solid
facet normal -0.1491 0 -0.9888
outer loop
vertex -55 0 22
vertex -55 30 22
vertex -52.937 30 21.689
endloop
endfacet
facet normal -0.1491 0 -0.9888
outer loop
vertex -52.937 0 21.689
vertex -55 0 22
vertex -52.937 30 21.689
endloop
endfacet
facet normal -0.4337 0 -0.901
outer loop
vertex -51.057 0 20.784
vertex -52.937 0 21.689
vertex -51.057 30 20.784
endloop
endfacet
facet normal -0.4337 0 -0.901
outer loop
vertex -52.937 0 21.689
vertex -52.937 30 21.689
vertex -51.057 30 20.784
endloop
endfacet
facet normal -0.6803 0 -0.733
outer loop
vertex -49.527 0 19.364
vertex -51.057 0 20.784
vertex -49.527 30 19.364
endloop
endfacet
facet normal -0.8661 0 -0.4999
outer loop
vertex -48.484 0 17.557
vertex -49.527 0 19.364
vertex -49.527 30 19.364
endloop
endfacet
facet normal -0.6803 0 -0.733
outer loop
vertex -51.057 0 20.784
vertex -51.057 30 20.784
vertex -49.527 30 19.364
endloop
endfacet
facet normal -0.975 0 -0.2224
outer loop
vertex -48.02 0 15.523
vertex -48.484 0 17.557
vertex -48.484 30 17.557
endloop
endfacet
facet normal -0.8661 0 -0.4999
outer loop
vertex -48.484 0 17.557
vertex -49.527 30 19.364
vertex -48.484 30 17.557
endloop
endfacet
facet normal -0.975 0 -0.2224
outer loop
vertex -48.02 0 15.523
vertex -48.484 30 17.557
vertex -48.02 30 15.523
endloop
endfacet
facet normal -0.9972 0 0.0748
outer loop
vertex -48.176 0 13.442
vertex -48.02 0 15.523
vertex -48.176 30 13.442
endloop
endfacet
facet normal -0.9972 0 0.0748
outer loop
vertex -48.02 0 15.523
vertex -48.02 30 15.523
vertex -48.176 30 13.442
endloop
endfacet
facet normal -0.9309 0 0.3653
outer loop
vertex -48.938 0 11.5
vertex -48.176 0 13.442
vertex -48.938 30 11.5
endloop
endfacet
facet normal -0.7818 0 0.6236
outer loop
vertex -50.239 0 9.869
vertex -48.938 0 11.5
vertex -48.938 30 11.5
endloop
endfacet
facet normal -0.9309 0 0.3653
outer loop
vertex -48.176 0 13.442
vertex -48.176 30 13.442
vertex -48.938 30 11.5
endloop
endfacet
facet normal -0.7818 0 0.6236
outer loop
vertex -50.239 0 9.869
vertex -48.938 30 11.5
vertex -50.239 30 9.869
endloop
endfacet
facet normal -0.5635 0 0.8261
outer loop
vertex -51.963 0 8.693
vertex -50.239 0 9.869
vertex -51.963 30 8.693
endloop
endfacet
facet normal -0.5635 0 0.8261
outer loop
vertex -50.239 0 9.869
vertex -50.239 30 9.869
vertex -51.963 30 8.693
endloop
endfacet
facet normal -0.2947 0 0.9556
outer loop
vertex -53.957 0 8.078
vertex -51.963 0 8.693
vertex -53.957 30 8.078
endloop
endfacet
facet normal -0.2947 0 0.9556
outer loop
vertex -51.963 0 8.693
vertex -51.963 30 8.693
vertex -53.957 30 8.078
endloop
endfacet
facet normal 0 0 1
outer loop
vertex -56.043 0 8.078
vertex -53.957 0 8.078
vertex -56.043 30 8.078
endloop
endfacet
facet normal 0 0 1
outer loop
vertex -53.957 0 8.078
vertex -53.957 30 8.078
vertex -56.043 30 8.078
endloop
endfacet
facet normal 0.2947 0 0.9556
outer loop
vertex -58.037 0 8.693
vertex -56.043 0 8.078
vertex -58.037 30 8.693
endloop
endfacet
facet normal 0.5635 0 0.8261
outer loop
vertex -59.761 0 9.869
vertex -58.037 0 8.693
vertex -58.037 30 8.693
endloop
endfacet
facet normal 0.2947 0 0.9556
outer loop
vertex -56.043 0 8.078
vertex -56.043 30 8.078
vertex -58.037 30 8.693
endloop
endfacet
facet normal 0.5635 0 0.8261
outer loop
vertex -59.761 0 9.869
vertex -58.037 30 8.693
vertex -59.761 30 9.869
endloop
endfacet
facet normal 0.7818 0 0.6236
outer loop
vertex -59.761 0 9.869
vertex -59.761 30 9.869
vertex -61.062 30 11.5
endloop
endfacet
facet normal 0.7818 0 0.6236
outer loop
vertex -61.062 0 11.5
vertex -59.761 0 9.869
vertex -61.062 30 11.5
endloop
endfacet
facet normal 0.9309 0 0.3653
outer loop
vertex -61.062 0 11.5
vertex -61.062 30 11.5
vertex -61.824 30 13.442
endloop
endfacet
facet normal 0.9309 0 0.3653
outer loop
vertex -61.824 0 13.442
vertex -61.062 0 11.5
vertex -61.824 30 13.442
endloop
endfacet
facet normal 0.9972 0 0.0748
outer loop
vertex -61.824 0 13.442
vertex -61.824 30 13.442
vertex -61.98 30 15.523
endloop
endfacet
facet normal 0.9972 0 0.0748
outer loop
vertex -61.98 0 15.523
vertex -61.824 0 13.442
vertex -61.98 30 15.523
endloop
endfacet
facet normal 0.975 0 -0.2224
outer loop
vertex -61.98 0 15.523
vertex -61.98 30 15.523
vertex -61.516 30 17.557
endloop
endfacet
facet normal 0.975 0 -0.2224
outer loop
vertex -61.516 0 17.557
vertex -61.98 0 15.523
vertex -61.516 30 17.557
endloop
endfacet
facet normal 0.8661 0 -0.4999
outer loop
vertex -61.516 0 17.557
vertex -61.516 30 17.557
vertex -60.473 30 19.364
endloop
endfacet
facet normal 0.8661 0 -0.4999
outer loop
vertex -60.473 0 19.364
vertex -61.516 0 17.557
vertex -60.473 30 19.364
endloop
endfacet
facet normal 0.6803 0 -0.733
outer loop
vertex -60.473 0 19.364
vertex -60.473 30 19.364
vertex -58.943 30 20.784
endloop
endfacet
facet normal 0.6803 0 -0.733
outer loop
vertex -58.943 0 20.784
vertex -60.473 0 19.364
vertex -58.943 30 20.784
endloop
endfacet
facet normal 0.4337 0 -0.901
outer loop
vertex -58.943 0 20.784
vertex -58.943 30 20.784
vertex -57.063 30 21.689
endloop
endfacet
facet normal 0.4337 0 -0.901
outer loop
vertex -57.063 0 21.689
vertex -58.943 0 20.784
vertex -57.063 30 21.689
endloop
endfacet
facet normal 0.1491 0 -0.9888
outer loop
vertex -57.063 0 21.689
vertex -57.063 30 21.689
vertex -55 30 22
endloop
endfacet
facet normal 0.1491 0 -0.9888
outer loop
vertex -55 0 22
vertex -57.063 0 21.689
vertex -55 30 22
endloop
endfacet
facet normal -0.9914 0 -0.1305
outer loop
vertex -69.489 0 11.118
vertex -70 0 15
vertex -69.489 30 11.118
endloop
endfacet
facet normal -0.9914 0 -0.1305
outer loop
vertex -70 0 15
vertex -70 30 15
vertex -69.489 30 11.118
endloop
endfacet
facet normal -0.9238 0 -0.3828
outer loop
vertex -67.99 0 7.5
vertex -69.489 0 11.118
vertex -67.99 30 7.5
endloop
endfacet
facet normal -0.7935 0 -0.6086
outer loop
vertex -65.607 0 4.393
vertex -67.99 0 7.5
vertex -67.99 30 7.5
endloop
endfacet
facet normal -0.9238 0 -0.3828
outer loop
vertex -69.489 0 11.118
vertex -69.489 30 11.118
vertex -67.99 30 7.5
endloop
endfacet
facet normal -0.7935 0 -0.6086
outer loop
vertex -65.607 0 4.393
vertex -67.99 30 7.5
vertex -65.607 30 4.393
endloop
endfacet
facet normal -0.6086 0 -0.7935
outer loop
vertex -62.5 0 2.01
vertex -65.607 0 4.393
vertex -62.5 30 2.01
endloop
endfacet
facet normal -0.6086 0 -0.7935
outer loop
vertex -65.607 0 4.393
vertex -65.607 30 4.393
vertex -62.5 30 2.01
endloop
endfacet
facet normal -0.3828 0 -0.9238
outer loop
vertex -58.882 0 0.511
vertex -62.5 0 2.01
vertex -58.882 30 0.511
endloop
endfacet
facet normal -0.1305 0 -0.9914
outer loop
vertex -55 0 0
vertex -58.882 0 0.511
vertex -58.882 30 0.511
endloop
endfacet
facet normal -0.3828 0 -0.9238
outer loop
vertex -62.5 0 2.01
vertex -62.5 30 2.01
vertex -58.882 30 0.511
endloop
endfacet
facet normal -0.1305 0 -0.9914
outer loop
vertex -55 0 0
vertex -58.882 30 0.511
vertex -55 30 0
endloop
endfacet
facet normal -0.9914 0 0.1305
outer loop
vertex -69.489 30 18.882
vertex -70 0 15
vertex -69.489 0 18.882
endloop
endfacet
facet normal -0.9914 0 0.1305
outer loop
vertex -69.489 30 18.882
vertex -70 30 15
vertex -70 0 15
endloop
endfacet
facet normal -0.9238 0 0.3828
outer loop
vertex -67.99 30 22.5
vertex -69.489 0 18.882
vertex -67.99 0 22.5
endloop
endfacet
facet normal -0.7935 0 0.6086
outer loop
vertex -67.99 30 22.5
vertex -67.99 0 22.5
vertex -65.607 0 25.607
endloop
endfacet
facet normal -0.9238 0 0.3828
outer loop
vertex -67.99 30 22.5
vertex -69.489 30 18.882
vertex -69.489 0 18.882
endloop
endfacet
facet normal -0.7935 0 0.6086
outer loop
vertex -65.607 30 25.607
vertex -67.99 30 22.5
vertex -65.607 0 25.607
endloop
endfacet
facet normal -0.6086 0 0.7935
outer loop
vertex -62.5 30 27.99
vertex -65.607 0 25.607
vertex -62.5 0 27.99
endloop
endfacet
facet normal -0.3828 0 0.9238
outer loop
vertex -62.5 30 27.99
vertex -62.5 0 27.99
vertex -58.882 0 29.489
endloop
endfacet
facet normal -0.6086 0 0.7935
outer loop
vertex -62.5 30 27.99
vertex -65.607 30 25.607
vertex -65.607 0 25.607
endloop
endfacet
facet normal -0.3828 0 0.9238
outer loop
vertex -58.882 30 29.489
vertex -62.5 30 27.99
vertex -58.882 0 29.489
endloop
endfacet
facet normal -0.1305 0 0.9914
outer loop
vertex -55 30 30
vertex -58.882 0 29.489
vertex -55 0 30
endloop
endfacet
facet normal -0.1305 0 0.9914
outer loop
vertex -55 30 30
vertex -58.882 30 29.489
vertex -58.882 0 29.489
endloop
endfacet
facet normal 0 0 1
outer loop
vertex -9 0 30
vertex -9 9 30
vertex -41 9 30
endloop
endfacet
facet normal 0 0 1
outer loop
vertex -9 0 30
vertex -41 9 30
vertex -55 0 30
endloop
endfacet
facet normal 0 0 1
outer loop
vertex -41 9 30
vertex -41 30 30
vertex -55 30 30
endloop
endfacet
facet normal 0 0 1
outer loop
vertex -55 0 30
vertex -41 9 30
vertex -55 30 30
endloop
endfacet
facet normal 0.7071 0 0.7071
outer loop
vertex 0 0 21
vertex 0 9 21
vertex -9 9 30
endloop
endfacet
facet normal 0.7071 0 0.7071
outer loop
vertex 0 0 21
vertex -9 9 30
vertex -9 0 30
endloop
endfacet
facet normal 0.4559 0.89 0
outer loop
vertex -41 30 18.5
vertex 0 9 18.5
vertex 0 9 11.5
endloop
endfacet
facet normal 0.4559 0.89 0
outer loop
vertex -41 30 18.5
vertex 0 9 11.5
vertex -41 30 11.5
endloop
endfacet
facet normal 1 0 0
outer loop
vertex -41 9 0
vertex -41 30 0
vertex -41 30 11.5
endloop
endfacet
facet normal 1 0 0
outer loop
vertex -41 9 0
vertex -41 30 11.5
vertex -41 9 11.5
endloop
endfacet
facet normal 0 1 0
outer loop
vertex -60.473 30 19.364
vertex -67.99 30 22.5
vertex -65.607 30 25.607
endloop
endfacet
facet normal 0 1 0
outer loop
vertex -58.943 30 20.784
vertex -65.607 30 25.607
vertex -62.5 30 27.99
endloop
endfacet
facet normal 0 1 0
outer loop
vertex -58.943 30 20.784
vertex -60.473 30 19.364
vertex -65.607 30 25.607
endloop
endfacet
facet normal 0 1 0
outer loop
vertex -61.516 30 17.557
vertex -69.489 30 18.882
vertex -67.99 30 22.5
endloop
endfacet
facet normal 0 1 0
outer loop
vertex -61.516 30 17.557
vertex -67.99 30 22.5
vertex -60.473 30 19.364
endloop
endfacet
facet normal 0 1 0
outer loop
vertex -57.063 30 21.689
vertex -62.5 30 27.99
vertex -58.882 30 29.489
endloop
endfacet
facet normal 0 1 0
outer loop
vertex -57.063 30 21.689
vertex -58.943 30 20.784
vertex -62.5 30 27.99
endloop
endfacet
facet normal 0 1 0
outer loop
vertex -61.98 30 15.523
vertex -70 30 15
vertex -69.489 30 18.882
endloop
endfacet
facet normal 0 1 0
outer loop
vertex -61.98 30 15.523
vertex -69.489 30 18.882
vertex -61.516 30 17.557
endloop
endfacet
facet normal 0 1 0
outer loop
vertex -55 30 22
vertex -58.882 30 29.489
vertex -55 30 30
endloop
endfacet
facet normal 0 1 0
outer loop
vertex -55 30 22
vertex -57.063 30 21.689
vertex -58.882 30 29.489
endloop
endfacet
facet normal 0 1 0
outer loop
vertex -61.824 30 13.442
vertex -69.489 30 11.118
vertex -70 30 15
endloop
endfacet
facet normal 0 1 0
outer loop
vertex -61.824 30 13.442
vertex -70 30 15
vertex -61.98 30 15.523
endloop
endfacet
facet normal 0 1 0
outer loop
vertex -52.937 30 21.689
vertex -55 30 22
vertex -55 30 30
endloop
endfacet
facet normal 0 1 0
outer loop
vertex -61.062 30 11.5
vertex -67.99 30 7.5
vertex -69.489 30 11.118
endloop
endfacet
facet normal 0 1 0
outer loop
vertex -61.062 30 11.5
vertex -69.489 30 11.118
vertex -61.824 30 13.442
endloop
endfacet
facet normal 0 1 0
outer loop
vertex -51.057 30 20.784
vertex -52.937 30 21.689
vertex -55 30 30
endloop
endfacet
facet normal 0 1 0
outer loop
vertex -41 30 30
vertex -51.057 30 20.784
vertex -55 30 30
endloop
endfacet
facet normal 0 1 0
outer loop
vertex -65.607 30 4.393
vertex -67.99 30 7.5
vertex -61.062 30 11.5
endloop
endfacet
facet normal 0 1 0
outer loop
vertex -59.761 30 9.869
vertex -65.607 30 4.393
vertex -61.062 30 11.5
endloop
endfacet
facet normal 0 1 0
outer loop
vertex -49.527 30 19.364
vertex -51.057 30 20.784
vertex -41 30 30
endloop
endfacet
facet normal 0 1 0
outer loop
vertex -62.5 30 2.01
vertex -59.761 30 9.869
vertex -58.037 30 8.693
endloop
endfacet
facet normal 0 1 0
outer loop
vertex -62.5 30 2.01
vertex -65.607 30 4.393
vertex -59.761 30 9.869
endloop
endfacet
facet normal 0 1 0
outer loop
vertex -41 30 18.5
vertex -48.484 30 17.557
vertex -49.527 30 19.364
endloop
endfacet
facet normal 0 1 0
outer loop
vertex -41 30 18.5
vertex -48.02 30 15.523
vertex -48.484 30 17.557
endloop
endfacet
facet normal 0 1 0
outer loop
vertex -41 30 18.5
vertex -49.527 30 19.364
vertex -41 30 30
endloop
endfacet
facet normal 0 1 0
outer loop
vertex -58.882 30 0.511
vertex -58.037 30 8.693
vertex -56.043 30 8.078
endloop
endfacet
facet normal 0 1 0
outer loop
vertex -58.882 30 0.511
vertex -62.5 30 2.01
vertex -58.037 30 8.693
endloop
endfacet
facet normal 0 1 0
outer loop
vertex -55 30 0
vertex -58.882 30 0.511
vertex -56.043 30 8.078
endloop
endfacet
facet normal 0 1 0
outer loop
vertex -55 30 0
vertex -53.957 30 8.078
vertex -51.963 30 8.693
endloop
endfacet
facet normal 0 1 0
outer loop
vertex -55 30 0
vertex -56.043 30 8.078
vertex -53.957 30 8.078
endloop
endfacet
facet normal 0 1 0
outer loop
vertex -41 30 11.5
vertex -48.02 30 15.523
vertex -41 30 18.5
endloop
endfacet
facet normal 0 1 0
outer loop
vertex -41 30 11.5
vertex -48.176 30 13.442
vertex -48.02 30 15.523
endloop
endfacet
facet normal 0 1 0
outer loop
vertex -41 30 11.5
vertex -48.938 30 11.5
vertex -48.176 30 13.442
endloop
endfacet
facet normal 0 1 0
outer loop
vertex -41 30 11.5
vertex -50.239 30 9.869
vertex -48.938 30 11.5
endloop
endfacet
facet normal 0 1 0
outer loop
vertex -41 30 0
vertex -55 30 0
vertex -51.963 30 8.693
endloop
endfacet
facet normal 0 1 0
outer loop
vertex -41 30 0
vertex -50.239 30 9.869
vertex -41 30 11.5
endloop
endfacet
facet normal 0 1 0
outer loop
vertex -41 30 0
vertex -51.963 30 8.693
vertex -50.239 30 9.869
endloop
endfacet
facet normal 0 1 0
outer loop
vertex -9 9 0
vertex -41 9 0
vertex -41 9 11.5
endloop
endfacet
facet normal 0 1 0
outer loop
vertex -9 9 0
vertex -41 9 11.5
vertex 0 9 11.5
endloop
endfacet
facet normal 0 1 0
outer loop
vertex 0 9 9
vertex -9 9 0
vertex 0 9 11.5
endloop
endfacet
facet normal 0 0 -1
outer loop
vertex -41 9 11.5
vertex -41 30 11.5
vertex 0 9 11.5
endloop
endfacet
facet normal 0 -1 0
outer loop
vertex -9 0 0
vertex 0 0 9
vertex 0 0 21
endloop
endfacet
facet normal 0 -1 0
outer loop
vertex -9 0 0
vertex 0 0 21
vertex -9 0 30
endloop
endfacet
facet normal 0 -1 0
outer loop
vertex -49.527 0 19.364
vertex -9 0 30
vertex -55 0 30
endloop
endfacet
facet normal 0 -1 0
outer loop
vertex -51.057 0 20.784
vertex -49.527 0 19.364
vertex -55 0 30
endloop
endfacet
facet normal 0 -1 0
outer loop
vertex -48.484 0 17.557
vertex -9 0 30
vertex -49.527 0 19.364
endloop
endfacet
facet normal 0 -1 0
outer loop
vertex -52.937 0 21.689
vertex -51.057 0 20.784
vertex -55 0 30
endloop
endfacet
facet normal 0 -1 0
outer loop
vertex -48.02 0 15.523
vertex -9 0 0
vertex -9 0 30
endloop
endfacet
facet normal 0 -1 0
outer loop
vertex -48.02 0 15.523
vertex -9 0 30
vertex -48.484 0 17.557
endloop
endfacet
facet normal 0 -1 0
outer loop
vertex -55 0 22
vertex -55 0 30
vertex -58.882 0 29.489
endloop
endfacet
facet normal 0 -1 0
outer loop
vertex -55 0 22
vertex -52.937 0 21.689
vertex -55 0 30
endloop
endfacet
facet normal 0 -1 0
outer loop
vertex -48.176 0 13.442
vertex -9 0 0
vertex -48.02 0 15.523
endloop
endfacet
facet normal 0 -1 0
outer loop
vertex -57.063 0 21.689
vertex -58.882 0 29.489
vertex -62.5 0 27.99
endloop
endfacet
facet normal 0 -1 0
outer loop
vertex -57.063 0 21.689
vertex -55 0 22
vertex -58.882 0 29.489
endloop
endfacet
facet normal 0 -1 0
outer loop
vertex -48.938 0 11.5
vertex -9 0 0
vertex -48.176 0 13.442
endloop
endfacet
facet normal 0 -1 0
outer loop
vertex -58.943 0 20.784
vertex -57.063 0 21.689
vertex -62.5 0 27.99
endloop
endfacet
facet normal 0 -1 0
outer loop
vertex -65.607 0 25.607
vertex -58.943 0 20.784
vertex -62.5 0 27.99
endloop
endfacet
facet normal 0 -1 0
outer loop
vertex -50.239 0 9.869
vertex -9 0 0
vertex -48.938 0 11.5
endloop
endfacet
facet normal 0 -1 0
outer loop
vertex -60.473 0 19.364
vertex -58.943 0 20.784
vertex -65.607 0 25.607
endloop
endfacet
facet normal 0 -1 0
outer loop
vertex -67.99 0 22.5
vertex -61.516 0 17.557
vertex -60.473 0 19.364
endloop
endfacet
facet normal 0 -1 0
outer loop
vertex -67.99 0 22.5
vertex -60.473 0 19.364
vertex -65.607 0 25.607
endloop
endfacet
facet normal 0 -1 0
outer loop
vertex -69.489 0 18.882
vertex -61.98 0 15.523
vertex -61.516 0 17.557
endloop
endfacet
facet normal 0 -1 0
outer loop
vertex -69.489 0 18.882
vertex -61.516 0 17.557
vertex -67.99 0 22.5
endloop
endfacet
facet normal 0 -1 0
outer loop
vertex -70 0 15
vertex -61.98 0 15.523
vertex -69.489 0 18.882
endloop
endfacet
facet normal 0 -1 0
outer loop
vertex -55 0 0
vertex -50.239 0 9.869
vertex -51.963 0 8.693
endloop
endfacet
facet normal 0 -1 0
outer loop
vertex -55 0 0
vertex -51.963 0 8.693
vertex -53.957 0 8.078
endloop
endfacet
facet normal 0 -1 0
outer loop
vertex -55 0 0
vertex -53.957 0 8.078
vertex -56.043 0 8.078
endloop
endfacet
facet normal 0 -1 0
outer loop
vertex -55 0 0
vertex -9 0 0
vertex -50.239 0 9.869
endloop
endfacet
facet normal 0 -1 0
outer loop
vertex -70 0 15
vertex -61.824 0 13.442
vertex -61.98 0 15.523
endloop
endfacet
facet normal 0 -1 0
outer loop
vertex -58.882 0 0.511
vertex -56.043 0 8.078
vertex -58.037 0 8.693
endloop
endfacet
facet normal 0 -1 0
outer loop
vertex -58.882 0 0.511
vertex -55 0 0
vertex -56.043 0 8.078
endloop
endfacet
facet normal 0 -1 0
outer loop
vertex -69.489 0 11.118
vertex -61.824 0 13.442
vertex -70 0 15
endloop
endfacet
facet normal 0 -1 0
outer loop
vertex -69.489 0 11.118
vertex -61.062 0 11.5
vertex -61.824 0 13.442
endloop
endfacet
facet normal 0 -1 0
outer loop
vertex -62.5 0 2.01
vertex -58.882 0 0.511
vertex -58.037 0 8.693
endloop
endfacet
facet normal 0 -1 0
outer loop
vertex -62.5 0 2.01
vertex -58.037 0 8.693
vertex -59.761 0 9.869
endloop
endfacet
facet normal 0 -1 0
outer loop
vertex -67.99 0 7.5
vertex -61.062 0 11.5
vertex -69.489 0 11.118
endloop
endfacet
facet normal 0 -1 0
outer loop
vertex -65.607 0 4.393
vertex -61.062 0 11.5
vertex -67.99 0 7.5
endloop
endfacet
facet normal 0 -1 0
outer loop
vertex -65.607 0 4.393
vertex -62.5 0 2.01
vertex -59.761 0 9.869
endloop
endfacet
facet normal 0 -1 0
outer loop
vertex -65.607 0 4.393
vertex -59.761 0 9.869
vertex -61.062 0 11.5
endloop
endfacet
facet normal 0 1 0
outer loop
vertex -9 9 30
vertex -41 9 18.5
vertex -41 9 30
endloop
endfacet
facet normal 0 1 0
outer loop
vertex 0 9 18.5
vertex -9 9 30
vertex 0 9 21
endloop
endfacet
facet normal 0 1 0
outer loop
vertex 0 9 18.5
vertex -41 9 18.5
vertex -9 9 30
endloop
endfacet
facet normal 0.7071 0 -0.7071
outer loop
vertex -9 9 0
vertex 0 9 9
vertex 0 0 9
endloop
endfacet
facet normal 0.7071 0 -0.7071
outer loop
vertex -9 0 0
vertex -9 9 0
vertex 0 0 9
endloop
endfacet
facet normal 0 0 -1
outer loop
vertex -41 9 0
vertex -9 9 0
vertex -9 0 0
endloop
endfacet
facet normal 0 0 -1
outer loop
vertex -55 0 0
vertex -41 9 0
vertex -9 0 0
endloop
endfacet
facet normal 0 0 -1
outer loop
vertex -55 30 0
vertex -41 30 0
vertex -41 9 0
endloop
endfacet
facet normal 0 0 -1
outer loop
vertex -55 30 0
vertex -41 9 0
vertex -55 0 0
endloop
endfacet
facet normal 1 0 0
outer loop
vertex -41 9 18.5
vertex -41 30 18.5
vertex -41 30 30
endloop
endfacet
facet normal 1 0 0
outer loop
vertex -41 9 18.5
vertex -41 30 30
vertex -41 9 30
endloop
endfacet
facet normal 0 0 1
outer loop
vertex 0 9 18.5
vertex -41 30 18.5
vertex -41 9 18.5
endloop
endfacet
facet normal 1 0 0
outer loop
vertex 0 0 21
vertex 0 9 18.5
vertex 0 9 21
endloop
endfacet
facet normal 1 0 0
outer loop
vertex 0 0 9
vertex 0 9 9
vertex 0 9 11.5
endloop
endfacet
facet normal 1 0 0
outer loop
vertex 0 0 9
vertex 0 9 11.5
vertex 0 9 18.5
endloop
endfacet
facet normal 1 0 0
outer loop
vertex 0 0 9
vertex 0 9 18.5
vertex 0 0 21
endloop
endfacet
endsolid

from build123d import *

# Parameters (mm, degrees)
EXTRUDE_1_DEPTH     = 30
FILLET_1_R          = 15
SKETCH_2_R          = 7
CUT_EXTRUDE_1_DEPTH = 82.853527719
EXTRUDE_START       = -11.5
EXTRUDE_3_DEPTH     = 7
CHAMFER_1_SIZE      = 9


with BuildPart() as part:
    # 스케치1 → 보스-돌출1 (new body)
    with BuildSketch(Plane.XY):
        Polygon((0, 0), (-70, 0), (-70, 30), (-41, 30), (-41, 9), (0, 9), align=None)
    extrude(amount=EXTRUDE_1_DEPTH)

    # 필렛1
    fillet_1_edges = [part.edges().sort_by_distance(p)[0] for p in [
        (-70, 15, 0),
        (-70, 15, 30),
    ]]
    fillet(fillet_1_edges, radius=FILLET_1_R - 0.0001)  # a hair under: the kernel refuses the full size

    # 스케치2 → 컷-돌출1 (cut, through all)
    with BuildSketch(Plane(origin=(0, 30, 0), x_dir=(1, 0, 0), z_dir=(0, 1, 0))):
        with Locations(Location((-55, -15, 0), (0, 0, 270))):
            Circle(SKETCH_2_R)
    extrude(amount=-CUT_EXTRUDE_1_DEPTH, mode=Mode.SUBTRACT)

    # 스케치3 → 보스-돌출3 (add)
    with BuildSketch(Plane.XY.offset(30).offset(EXTRUDE_START)):
        Polygon((0, 9), (-41, 30), (-41, 9), align=None)
    extrude(amount=-EXTRUDE_3_DEPTH)

    # 모따기1
    chamfer_1_edges = [part.edges().sort_by_distance(p)[0] for p in [
        (0, 4.5, 30),
        (0, 4.5, 0),
    ]]
    chamfer(chamfer_1_edges, length=CHAMFER_1_SIZE)


solid = part.part
